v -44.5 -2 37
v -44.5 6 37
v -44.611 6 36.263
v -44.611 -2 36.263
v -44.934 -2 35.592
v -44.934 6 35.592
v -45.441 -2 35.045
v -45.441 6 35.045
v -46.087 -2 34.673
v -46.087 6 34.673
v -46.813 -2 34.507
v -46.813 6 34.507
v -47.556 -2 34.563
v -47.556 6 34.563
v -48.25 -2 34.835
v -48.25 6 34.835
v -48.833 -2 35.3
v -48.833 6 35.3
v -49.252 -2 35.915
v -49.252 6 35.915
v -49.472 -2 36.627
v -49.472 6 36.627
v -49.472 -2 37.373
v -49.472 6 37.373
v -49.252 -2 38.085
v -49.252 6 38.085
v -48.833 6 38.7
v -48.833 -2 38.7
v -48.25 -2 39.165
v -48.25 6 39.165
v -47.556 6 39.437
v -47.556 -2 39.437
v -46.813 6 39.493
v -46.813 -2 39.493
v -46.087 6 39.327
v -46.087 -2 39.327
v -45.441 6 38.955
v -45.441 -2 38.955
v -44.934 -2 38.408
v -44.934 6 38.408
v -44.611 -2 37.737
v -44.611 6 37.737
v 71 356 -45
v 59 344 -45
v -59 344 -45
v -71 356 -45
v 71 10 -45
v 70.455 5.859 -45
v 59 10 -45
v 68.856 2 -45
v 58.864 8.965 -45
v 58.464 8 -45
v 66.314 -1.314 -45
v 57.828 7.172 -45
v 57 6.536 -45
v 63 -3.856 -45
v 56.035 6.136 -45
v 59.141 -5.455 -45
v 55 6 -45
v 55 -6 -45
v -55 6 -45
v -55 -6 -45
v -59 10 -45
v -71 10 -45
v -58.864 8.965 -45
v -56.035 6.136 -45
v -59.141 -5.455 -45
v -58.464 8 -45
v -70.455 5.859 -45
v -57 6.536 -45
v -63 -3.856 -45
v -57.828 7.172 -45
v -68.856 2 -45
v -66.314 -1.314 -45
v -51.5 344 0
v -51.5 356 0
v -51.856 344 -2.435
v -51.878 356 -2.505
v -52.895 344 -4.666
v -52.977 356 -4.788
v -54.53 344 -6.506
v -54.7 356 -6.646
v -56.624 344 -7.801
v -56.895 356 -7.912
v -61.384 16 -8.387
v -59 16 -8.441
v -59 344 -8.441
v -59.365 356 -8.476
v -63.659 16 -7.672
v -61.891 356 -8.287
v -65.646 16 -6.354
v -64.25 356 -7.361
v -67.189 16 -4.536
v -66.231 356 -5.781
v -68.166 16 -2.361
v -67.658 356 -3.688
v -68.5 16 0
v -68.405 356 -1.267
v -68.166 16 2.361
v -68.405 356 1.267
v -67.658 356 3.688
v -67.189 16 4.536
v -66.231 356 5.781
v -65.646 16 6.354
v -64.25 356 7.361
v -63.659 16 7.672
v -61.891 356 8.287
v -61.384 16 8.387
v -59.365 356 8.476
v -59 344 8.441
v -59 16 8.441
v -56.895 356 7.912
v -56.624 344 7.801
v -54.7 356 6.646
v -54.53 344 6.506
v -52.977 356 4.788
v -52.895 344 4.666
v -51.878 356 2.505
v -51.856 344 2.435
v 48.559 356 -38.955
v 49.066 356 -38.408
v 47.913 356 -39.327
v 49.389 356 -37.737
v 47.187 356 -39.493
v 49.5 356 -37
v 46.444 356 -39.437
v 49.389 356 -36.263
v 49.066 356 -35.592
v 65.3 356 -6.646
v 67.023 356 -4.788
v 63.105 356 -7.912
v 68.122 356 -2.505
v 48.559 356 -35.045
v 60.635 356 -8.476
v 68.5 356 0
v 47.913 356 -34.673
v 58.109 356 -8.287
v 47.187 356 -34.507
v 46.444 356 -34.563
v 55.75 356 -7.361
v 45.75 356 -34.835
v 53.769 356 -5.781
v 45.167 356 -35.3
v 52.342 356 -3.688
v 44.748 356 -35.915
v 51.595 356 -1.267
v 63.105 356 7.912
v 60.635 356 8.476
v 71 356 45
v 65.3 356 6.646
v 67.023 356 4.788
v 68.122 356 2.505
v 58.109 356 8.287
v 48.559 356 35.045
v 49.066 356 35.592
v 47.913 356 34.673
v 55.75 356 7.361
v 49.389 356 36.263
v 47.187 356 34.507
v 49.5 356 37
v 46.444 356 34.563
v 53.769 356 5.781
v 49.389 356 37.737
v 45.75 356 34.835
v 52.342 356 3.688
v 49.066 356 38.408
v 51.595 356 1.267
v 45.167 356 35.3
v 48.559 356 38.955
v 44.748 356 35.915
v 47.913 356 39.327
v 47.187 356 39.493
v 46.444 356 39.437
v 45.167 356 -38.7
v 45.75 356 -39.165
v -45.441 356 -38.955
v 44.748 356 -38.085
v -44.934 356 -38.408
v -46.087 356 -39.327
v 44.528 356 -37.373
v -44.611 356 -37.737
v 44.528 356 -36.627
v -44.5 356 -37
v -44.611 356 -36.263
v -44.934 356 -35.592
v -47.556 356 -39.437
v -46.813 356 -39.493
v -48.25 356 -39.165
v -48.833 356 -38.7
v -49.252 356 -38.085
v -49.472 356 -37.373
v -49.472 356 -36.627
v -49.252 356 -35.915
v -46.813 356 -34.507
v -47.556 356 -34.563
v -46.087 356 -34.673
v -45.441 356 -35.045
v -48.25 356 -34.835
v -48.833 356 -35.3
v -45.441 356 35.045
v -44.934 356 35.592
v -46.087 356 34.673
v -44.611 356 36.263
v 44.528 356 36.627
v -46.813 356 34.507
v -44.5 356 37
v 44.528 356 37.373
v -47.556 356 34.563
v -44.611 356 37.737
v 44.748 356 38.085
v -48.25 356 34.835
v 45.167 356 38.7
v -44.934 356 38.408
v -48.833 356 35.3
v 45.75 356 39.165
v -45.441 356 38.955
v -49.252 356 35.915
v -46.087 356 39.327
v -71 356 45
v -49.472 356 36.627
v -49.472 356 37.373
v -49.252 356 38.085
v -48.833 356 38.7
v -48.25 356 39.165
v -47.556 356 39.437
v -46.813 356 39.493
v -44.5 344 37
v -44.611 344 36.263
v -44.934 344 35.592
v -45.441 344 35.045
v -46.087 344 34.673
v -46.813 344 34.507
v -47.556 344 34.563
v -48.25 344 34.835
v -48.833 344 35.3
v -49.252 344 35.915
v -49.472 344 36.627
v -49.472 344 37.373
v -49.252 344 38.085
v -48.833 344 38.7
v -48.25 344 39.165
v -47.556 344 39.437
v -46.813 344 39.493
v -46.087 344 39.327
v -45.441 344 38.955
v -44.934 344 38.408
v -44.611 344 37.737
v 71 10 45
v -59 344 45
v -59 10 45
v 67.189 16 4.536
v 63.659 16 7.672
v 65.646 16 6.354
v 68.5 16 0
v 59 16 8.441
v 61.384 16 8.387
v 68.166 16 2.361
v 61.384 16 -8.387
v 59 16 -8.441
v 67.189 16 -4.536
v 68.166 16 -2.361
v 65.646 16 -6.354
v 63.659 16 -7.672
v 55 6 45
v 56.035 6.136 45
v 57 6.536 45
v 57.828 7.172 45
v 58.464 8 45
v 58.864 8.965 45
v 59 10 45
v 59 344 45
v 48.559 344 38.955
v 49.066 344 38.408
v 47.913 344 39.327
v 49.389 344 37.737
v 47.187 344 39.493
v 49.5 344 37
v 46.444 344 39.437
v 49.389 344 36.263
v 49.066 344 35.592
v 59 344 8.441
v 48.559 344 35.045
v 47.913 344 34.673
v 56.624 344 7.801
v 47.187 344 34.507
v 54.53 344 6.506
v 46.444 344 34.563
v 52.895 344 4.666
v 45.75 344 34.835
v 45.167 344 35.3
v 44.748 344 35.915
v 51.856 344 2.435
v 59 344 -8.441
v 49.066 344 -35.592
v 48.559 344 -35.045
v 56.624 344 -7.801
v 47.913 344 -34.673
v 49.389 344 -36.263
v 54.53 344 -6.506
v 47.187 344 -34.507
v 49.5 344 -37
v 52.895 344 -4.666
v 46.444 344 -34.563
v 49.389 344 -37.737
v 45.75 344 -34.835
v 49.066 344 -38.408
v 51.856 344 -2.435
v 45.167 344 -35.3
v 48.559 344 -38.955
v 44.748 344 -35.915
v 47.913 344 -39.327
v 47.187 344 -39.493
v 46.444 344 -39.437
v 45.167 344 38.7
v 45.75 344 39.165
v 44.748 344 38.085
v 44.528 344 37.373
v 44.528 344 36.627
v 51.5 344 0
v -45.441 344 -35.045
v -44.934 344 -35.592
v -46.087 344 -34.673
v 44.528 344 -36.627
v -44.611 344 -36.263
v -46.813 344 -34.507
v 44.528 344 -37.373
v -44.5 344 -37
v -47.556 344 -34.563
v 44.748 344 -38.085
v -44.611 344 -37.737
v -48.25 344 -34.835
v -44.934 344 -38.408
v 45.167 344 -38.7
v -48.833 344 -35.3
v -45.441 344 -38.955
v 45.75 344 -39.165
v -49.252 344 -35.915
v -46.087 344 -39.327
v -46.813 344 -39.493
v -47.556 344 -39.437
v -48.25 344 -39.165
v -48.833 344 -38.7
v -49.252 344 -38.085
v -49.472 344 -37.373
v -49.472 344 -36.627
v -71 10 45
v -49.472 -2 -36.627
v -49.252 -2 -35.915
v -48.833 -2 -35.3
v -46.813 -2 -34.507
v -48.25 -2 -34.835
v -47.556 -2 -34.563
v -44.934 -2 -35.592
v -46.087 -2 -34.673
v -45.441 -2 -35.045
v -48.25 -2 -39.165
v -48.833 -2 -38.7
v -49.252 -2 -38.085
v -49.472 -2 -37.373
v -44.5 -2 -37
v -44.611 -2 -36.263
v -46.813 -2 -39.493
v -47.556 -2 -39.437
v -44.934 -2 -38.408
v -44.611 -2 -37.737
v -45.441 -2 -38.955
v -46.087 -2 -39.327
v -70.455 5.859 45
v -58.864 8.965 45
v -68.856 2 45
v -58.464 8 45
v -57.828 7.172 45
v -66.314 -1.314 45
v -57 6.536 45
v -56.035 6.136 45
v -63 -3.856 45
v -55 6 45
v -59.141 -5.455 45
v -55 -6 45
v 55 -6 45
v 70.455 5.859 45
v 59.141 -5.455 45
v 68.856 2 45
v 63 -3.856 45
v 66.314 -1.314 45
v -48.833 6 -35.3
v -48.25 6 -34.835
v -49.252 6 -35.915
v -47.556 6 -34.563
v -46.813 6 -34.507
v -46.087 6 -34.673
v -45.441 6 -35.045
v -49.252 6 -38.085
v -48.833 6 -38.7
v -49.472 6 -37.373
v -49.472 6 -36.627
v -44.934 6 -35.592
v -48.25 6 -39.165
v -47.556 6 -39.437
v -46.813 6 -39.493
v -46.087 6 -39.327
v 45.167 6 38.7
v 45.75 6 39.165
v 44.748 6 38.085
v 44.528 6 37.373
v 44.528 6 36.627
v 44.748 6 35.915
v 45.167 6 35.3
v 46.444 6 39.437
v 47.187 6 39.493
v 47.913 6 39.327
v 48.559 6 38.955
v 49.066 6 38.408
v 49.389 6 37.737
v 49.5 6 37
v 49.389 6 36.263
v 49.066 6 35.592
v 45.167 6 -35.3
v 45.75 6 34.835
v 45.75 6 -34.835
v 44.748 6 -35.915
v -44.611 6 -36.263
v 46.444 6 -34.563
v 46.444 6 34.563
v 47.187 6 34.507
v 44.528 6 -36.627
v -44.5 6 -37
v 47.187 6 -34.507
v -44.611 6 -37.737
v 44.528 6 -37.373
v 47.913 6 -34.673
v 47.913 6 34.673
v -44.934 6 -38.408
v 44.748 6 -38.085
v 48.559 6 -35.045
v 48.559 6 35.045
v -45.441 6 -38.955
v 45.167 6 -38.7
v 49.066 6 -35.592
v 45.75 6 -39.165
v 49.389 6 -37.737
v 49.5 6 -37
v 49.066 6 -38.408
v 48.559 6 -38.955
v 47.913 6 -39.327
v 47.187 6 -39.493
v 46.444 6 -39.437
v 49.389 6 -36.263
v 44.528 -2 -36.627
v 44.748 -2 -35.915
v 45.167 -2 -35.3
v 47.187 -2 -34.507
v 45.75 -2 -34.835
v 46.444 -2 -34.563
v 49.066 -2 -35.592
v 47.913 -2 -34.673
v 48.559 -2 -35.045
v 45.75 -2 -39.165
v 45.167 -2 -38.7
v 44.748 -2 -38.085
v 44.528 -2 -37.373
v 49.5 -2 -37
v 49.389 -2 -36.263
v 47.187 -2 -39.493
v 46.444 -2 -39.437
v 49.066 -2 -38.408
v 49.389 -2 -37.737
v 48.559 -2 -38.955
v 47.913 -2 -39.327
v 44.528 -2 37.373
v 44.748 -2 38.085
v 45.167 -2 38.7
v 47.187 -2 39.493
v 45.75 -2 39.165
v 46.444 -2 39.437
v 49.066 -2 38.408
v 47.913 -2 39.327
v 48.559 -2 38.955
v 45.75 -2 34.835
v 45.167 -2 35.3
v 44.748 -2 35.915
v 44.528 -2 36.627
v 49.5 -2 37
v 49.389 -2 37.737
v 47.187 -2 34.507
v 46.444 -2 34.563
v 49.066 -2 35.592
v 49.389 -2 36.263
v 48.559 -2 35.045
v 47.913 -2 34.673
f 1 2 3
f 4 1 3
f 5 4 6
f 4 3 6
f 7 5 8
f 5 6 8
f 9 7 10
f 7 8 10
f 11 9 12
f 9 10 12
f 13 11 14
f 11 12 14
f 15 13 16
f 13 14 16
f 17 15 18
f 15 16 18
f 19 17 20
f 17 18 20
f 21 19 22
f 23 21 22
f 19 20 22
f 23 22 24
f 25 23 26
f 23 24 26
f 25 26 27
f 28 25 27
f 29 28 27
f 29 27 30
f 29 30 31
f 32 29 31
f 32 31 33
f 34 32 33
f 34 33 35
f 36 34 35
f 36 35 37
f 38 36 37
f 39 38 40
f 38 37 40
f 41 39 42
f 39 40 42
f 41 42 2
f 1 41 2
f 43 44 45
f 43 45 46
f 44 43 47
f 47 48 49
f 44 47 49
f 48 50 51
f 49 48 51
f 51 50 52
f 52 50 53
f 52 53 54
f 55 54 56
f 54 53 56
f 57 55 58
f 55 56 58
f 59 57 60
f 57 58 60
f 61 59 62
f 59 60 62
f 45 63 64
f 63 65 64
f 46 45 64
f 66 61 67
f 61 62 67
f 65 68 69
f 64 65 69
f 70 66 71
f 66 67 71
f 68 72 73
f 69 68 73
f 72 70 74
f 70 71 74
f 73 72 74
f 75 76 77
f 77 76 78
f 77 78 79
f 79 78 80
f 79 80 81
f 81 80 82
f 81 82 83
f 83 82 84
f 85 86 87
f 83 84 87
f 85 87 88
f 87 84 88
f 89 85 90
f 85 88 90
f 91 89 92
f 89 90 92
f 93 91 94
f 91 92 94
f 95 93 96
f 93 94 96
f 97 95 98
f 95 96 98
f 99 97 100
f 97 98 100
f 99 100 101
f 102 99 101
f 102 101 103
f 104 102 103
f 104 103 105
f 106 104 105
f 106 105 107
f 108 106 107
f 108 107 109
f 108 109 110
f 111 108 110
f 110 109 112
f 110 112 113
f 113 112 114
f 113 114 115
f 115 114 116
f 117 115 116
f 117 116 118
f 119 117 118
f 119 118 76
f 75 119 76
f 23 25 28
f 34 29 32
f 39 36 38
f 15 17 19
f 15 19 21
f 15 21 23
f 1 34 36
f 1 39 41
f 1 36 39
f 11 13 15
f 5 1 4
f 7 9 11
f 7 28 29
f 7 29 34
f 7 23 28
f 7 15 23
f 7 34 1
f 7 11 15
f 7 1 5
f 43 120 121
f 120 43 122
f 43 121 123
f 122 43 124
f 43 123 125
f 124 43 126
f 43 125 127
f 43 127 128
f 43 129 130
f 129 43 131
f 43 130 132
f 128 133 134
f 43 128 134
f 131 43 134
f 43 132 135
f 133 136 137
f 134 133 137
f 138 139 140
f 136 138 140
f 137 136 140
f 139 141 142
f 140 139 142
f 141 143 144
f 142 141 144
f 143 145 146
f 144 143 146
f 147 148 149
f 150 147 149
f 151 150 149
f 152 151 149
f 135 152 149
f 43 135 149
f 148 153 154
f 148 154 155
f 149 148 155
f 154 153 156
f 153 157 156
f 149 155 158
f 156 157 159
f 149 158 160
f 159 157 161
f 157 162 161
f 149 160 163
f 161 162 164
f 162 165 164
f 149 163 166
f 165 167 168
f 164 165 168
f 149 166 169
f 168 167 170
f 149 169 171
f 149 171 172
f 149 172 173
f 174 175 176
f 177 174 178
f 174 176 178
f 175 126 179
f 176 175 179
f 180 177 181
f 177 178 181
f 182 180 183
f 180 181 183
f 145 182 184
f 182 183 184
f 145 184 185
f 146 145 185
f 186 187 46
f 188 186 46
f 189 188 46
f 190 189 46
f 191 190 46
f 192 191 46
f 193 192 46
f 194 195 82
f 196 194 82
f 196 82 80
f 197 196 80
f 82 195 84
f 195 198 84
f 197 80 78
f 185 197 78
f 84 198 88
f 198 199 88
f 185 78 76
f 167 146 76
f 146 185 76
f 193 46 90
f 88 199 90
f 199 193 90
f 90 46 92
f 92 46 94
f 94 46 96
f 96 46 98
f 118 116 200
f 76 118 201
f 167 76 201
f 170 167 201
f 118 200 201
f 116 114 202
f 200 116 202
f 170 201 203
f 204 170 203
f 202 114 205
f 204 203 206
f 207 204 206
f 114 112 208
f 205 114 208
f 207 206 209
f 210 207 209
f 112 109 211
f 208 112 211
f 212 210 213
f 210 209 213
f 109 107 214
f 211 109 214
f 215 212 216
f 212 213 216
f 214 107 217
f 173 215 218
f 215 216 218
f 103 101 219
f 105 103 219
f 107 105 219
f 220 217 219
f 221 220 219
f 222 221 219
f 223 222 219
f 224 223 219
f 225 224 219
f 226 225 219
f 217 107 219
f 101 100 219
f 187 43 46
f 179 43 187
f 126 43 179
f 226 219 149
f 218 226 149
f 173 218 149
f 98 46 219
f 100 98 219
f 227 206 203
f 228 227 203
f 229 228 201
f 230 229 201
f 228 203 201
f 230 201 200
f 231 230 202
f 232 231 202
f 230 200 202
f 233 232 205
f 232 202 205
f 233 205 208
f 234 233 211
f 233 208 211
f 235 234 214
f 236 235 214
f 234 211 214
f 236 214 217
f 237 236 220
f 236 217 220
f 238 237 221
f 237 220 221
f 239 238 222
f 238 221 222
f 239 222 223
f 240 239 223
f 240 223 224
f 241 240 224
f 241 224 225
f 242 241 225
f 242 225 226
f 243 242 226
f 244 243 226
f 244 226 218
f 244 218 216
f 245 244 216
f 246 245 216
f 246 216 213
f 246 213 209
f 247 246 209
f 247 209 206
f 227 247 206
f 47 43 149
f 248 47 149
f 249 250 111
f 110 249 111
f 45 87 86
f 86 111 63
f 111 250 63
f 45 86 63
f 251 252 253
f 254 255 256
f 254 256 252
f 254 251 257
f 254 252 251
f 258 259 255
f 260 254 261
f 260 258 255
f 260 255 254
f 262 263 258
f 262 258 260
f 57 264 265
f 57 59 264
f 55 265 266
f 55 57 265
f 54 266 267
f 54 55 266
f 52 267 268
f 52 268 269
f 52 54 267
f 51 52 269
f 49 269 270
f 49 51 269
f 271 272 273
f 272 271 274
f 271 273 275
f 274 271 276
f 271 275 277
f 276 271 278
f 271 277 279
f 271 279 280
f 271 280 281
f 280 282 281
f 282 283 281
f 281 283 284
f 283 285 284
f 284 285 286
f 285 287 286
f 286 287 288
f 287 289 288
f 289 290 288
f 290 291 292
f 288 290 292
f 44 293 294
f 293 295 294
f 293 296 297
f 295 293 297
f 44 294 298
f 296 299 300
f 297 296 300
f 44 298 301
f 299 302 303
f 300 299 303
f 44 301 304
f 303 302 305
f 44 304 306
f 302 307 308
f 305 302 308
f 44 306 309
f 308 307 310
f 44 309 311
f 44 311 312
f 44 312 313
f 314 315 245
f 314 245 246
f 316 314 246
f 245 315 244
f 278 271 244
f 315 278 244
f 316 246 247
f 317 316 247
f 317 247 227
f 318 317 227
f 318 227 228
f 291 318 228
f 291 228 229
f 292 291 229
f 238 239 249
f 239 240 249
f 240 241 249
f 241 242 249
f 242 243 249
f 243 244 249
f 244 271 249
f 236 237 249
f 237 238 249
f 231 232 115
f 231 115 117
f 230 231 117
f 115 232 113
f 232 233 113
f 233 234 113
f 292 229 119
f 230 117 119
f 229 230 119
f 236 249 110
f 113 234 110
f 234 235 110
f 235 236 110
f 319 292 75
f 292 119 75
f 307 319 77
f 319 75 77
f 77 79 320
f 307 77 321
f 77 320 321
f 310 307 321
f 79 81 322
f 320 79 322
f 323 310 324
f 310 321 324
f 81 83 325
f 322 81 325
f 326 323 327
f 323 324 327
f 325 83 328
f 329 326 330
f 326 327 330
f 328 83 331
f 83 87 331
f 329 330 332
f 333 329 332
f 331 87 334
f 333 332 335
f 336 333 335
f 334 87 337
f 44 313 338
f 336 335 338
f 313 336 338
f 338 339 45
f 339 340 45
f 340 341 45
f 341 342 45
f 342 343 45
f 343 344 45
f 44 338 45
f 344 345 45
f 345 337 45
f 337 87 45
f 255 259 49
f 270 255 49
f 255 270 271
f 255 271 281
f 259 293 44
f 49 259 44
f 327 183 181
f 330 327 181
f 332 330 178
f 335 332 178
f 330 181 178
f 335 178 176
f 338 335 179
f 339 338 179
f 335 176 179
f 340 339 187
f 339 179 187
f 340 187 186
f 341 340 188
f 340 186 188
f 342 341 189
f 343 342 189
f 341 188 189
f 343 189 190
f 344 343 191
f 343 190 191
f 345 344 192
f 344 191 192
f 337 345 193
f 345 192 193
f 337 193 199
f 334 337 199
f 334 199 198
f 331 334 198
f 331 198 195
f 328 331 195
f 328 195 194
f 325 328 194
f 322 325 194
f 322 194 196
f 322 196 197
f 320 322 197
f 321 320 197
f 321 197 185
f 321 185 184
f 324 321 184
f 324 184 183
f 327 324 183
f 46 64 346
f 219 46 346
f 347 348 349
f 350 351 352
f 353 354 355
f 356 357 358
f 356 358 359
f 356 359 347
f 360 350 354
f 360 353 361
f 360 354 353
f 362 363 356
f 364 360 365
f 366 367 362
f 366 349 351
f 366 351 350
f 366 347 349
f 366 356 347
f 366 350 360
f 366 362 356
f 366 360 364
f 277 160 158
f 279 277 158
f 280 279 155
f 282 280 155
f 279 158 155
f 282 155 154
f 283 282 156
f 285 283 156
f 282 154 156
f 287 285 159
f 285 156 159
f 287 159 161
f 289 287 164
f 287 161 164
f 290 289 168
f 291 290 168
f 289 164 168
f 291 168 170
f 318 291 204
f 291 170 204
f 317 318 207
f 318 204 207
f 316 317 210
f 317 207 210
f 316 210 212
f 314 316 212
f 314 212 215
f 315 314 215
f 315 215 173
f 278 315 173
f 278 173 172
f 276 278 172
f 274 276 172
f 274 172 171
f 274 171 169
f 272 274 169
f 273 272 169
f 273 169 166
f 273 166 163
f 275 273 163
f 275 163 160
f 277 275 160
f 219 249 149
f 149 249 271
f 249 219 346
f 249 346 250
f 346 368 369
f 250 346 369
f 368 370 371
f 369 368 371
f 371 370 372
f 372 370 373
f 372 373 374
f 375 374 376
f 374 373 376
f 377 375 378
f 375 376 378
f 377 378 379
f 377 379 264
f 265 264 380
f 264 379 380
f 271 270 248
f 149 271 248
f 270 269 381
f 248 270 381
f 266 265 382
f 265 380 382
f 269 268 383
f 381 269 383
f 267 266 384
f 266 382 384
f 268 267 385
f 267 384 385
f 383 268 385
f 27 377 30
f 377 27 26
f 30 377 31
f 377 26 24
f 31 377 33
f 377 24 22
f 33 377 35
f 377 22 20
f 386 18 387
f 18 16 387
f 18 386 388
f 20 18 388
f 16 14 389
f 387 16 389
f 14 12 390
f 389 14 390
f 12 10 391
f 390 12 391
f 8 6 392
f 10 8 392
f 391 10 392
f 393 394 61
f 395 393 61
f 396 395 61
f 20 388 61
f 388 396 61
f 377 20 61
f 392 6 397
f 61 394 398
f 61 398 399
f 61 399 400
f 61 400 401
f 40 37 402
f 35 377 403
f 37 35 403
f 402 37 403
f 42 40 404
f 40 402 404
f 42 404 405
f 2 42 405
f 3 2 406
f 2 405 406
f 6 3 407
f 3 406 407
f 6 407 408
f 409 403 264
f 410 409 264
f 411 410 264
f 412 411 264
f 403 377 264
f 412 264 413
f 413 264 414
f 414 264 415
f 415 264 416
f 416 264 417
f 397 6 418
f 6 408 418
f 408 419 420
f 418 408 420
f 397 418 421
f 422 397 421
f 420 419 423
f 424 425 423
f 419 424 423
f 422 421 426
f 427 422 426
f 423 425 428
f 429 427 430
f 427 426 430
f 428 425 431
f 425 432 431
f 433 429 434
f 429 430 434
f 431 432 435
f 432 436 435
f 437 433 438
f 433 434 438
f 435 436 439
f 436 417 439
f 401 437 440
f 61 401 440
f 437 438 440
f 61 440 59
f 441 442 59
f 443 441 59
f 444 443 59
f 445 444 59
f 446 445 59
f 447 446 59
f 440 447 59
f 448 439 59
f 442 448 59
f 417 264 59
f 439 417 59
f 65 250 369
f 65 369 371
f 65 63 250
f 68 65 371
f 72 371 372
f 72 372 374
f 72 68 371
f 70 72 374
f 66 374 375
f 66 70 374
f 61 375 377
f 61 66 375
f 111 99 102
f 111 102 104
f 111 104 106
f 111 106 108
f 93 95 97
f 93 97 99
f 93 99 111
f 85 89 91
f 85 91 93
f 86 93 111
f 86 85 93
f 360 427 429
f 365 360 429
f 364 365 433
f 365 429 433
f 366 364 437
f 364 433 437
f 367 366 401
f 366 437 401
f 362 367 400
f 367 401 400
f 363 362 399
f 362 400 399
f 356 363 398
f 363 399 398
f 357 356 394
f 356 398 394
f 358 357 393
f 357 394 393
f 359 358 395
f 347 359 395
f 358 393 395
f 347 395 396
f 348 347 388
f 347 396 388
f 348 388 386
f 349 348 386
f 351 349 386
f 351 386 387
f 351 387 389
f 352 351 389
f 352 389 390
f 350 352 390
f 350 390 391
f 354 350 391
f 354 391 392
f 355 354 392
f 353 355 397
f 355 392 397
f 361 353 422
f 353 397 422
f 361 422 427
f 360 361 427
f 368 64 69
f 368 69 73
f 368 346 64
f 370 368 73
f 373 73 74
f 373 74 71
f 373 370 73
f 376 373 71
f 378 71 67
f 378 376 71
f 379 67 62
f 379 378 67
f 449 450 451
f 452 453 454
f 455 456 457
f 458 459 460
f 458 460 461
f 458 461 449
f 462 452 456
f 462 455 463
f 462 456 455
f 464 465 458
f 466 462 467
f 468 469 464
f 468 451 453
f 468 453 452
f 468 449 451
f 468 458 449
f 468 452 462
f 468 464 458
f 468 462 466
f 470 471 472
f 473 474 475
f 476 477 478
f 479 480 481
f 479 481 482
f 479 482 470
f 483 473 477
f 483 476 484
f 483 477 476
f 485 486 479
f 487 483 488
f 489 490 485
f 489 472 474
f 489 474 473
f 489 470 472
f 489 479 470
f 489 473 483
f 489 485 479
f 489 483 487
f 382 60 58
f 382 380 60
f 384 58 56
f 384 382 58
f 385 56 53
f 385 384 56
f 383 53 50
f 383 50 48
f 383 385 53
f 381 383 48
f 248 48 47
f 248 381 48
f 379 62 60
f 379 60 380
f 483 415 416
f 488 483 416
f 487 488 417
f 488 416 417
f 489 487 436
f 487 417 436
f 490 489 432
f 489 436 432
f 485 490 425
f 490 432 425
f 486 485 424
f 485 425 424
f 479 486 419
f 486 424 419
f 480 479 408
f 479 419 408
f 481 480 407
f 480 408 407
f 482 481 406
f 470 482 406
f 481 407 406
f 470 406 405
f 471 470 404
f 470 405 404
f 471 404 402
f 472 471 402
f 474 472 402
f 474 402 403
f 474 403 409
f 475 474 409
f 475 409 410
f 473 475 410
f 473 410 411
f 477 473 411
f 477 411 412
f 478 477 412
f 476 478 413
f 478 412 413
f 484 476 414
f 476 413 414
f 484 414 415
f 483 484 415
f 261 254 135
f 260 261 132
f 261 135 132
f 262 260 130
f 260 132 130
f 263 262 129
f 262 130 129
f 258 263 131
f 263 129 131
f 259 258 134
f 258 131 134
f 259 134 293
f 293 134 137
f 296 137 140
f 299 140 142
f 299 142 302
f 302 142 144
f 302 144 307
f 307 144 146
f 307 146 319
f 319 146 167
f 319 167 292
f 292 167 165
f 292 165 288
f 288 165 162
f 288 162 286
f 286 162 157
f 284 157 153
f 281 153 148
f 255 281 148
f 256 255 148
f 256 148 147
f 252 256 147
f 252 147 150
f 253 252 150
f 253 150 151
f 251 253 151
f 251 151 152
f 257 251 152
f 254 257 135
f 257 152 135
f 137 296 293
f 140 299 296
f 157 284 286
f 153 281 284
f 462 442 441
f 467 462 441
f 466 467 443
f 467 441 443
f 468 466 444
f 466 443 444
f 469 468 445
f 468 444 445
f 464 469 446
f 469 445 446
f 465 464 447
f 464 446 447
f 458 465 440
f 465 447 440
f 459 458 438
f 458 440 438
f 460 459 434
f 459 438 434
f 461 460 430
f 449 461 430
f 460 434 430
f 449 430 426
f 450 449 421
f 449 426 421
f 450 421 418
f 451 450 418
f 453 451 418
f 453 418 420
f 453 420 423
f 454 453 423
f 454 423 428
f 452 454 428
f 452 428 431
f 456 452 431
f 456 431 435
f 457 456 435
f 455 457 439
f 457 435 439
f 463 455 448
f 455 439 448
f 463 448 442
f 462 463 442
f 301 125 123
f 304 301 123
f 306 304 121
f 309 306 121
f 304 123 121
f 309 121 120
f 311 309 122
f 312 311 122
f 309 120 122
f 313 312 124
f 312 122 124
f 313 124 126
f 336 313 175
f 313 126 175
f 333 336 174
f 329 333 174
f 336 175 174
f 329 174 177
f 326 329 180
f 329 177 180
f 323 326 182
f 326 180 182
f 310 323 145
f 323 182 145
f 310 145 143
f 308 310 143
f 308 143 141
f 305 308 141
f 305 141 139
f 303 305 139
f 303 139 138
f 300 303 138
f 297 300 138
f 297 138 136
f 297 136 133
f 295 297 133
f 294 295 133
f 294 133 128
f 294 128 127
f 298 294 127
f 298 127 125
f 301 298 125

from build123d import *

# Parameters (mm, degrees)
SKETCH6_W          = 90
SKETCH6_H          = 12
SKETCH7_R          = 8.5
SKETCH7_R_2        = 2.5
CUT_EXTRUDE1_DEPTH = 340
SKETCH8_R          = 2.5
CUT_EXTRUDE2_DEPTH = 8


with BuildPart() as part:
    # Sweep2: sweep along a path in Sketch4
    with BuildLine(Plane.XY) as sweep2_path:
        Line((-65, 350), (-65, 10))
        ThreePointArc((-65, 10), (-62.071067812, 2.928932188), (-55, 0))
        Line((-55, 0), (55, 0))
        ThreePointArc((55, 0), (62.071067812, 2.928932188), (65, 10))
        Line((65, 10), (65, 350))
        Line((65, 350), (-65, 350))
    # Sketch6 → Sweep2 (sweep)
    with BuildSketch(Plane(origin=(0, 0, 0), x_dir=(0, 0, -1), z_dir=(1, 0, 0))):
        with Locations((0, 350)):
            Rectangle(SKETCH6_W, SKETCH6_H)
    sweep(path=sweep2_path.line, transition=Transition.RIGHT)

    # Sketch7 → Cut-Extrude1 (cut)
    with BuildSketch(Plane(origin=(0, 356, 0), x_dir=(1, 0, 0), z_dir=(0, 1, 0))):
        with Locations((60, 0)):
            Circle(SKETCH7_R)
        with Locations((-60, 0)):
            Circle(SKETCH7_R)
        with Locations((-47, -37)):
            Circle(SKETCH7_R_2)
        with Locations((-47, 37)):
            Circle(SKETCH7_R_2)
        with Locations((47, -37)):
            Circle(SKETCH7_R_2)
        with Locations((47, 37)):
            Circle(SKETCH7_R_2)
    extrude(amount=-CUT_EXTRUDE1_DEPTH, mode=Mode.SUBTRACT)

    # Sketch8 → Cut-Extrude2 (cut)
    with BuildSketch(Plane(origin=(0, 6, 0), x_dir=(1, 0, 0), z_dir=(0, 1, 0))):
        with Locations((47, 37)):
            Circle(SKETCH8_R)
        with Locations((-47, 37)):
            Circle(SKETCH8_R)
        with Locations((-47, -37)):
            Circle(SKETCH8_R)
        with Locations((47, -37)):
            Circle(SKETCH8_R)
    extrude(amount=-CUT_EXTRUDE2_DEPTH, mode=Mode.SUBTRACT)


solid = part.part
